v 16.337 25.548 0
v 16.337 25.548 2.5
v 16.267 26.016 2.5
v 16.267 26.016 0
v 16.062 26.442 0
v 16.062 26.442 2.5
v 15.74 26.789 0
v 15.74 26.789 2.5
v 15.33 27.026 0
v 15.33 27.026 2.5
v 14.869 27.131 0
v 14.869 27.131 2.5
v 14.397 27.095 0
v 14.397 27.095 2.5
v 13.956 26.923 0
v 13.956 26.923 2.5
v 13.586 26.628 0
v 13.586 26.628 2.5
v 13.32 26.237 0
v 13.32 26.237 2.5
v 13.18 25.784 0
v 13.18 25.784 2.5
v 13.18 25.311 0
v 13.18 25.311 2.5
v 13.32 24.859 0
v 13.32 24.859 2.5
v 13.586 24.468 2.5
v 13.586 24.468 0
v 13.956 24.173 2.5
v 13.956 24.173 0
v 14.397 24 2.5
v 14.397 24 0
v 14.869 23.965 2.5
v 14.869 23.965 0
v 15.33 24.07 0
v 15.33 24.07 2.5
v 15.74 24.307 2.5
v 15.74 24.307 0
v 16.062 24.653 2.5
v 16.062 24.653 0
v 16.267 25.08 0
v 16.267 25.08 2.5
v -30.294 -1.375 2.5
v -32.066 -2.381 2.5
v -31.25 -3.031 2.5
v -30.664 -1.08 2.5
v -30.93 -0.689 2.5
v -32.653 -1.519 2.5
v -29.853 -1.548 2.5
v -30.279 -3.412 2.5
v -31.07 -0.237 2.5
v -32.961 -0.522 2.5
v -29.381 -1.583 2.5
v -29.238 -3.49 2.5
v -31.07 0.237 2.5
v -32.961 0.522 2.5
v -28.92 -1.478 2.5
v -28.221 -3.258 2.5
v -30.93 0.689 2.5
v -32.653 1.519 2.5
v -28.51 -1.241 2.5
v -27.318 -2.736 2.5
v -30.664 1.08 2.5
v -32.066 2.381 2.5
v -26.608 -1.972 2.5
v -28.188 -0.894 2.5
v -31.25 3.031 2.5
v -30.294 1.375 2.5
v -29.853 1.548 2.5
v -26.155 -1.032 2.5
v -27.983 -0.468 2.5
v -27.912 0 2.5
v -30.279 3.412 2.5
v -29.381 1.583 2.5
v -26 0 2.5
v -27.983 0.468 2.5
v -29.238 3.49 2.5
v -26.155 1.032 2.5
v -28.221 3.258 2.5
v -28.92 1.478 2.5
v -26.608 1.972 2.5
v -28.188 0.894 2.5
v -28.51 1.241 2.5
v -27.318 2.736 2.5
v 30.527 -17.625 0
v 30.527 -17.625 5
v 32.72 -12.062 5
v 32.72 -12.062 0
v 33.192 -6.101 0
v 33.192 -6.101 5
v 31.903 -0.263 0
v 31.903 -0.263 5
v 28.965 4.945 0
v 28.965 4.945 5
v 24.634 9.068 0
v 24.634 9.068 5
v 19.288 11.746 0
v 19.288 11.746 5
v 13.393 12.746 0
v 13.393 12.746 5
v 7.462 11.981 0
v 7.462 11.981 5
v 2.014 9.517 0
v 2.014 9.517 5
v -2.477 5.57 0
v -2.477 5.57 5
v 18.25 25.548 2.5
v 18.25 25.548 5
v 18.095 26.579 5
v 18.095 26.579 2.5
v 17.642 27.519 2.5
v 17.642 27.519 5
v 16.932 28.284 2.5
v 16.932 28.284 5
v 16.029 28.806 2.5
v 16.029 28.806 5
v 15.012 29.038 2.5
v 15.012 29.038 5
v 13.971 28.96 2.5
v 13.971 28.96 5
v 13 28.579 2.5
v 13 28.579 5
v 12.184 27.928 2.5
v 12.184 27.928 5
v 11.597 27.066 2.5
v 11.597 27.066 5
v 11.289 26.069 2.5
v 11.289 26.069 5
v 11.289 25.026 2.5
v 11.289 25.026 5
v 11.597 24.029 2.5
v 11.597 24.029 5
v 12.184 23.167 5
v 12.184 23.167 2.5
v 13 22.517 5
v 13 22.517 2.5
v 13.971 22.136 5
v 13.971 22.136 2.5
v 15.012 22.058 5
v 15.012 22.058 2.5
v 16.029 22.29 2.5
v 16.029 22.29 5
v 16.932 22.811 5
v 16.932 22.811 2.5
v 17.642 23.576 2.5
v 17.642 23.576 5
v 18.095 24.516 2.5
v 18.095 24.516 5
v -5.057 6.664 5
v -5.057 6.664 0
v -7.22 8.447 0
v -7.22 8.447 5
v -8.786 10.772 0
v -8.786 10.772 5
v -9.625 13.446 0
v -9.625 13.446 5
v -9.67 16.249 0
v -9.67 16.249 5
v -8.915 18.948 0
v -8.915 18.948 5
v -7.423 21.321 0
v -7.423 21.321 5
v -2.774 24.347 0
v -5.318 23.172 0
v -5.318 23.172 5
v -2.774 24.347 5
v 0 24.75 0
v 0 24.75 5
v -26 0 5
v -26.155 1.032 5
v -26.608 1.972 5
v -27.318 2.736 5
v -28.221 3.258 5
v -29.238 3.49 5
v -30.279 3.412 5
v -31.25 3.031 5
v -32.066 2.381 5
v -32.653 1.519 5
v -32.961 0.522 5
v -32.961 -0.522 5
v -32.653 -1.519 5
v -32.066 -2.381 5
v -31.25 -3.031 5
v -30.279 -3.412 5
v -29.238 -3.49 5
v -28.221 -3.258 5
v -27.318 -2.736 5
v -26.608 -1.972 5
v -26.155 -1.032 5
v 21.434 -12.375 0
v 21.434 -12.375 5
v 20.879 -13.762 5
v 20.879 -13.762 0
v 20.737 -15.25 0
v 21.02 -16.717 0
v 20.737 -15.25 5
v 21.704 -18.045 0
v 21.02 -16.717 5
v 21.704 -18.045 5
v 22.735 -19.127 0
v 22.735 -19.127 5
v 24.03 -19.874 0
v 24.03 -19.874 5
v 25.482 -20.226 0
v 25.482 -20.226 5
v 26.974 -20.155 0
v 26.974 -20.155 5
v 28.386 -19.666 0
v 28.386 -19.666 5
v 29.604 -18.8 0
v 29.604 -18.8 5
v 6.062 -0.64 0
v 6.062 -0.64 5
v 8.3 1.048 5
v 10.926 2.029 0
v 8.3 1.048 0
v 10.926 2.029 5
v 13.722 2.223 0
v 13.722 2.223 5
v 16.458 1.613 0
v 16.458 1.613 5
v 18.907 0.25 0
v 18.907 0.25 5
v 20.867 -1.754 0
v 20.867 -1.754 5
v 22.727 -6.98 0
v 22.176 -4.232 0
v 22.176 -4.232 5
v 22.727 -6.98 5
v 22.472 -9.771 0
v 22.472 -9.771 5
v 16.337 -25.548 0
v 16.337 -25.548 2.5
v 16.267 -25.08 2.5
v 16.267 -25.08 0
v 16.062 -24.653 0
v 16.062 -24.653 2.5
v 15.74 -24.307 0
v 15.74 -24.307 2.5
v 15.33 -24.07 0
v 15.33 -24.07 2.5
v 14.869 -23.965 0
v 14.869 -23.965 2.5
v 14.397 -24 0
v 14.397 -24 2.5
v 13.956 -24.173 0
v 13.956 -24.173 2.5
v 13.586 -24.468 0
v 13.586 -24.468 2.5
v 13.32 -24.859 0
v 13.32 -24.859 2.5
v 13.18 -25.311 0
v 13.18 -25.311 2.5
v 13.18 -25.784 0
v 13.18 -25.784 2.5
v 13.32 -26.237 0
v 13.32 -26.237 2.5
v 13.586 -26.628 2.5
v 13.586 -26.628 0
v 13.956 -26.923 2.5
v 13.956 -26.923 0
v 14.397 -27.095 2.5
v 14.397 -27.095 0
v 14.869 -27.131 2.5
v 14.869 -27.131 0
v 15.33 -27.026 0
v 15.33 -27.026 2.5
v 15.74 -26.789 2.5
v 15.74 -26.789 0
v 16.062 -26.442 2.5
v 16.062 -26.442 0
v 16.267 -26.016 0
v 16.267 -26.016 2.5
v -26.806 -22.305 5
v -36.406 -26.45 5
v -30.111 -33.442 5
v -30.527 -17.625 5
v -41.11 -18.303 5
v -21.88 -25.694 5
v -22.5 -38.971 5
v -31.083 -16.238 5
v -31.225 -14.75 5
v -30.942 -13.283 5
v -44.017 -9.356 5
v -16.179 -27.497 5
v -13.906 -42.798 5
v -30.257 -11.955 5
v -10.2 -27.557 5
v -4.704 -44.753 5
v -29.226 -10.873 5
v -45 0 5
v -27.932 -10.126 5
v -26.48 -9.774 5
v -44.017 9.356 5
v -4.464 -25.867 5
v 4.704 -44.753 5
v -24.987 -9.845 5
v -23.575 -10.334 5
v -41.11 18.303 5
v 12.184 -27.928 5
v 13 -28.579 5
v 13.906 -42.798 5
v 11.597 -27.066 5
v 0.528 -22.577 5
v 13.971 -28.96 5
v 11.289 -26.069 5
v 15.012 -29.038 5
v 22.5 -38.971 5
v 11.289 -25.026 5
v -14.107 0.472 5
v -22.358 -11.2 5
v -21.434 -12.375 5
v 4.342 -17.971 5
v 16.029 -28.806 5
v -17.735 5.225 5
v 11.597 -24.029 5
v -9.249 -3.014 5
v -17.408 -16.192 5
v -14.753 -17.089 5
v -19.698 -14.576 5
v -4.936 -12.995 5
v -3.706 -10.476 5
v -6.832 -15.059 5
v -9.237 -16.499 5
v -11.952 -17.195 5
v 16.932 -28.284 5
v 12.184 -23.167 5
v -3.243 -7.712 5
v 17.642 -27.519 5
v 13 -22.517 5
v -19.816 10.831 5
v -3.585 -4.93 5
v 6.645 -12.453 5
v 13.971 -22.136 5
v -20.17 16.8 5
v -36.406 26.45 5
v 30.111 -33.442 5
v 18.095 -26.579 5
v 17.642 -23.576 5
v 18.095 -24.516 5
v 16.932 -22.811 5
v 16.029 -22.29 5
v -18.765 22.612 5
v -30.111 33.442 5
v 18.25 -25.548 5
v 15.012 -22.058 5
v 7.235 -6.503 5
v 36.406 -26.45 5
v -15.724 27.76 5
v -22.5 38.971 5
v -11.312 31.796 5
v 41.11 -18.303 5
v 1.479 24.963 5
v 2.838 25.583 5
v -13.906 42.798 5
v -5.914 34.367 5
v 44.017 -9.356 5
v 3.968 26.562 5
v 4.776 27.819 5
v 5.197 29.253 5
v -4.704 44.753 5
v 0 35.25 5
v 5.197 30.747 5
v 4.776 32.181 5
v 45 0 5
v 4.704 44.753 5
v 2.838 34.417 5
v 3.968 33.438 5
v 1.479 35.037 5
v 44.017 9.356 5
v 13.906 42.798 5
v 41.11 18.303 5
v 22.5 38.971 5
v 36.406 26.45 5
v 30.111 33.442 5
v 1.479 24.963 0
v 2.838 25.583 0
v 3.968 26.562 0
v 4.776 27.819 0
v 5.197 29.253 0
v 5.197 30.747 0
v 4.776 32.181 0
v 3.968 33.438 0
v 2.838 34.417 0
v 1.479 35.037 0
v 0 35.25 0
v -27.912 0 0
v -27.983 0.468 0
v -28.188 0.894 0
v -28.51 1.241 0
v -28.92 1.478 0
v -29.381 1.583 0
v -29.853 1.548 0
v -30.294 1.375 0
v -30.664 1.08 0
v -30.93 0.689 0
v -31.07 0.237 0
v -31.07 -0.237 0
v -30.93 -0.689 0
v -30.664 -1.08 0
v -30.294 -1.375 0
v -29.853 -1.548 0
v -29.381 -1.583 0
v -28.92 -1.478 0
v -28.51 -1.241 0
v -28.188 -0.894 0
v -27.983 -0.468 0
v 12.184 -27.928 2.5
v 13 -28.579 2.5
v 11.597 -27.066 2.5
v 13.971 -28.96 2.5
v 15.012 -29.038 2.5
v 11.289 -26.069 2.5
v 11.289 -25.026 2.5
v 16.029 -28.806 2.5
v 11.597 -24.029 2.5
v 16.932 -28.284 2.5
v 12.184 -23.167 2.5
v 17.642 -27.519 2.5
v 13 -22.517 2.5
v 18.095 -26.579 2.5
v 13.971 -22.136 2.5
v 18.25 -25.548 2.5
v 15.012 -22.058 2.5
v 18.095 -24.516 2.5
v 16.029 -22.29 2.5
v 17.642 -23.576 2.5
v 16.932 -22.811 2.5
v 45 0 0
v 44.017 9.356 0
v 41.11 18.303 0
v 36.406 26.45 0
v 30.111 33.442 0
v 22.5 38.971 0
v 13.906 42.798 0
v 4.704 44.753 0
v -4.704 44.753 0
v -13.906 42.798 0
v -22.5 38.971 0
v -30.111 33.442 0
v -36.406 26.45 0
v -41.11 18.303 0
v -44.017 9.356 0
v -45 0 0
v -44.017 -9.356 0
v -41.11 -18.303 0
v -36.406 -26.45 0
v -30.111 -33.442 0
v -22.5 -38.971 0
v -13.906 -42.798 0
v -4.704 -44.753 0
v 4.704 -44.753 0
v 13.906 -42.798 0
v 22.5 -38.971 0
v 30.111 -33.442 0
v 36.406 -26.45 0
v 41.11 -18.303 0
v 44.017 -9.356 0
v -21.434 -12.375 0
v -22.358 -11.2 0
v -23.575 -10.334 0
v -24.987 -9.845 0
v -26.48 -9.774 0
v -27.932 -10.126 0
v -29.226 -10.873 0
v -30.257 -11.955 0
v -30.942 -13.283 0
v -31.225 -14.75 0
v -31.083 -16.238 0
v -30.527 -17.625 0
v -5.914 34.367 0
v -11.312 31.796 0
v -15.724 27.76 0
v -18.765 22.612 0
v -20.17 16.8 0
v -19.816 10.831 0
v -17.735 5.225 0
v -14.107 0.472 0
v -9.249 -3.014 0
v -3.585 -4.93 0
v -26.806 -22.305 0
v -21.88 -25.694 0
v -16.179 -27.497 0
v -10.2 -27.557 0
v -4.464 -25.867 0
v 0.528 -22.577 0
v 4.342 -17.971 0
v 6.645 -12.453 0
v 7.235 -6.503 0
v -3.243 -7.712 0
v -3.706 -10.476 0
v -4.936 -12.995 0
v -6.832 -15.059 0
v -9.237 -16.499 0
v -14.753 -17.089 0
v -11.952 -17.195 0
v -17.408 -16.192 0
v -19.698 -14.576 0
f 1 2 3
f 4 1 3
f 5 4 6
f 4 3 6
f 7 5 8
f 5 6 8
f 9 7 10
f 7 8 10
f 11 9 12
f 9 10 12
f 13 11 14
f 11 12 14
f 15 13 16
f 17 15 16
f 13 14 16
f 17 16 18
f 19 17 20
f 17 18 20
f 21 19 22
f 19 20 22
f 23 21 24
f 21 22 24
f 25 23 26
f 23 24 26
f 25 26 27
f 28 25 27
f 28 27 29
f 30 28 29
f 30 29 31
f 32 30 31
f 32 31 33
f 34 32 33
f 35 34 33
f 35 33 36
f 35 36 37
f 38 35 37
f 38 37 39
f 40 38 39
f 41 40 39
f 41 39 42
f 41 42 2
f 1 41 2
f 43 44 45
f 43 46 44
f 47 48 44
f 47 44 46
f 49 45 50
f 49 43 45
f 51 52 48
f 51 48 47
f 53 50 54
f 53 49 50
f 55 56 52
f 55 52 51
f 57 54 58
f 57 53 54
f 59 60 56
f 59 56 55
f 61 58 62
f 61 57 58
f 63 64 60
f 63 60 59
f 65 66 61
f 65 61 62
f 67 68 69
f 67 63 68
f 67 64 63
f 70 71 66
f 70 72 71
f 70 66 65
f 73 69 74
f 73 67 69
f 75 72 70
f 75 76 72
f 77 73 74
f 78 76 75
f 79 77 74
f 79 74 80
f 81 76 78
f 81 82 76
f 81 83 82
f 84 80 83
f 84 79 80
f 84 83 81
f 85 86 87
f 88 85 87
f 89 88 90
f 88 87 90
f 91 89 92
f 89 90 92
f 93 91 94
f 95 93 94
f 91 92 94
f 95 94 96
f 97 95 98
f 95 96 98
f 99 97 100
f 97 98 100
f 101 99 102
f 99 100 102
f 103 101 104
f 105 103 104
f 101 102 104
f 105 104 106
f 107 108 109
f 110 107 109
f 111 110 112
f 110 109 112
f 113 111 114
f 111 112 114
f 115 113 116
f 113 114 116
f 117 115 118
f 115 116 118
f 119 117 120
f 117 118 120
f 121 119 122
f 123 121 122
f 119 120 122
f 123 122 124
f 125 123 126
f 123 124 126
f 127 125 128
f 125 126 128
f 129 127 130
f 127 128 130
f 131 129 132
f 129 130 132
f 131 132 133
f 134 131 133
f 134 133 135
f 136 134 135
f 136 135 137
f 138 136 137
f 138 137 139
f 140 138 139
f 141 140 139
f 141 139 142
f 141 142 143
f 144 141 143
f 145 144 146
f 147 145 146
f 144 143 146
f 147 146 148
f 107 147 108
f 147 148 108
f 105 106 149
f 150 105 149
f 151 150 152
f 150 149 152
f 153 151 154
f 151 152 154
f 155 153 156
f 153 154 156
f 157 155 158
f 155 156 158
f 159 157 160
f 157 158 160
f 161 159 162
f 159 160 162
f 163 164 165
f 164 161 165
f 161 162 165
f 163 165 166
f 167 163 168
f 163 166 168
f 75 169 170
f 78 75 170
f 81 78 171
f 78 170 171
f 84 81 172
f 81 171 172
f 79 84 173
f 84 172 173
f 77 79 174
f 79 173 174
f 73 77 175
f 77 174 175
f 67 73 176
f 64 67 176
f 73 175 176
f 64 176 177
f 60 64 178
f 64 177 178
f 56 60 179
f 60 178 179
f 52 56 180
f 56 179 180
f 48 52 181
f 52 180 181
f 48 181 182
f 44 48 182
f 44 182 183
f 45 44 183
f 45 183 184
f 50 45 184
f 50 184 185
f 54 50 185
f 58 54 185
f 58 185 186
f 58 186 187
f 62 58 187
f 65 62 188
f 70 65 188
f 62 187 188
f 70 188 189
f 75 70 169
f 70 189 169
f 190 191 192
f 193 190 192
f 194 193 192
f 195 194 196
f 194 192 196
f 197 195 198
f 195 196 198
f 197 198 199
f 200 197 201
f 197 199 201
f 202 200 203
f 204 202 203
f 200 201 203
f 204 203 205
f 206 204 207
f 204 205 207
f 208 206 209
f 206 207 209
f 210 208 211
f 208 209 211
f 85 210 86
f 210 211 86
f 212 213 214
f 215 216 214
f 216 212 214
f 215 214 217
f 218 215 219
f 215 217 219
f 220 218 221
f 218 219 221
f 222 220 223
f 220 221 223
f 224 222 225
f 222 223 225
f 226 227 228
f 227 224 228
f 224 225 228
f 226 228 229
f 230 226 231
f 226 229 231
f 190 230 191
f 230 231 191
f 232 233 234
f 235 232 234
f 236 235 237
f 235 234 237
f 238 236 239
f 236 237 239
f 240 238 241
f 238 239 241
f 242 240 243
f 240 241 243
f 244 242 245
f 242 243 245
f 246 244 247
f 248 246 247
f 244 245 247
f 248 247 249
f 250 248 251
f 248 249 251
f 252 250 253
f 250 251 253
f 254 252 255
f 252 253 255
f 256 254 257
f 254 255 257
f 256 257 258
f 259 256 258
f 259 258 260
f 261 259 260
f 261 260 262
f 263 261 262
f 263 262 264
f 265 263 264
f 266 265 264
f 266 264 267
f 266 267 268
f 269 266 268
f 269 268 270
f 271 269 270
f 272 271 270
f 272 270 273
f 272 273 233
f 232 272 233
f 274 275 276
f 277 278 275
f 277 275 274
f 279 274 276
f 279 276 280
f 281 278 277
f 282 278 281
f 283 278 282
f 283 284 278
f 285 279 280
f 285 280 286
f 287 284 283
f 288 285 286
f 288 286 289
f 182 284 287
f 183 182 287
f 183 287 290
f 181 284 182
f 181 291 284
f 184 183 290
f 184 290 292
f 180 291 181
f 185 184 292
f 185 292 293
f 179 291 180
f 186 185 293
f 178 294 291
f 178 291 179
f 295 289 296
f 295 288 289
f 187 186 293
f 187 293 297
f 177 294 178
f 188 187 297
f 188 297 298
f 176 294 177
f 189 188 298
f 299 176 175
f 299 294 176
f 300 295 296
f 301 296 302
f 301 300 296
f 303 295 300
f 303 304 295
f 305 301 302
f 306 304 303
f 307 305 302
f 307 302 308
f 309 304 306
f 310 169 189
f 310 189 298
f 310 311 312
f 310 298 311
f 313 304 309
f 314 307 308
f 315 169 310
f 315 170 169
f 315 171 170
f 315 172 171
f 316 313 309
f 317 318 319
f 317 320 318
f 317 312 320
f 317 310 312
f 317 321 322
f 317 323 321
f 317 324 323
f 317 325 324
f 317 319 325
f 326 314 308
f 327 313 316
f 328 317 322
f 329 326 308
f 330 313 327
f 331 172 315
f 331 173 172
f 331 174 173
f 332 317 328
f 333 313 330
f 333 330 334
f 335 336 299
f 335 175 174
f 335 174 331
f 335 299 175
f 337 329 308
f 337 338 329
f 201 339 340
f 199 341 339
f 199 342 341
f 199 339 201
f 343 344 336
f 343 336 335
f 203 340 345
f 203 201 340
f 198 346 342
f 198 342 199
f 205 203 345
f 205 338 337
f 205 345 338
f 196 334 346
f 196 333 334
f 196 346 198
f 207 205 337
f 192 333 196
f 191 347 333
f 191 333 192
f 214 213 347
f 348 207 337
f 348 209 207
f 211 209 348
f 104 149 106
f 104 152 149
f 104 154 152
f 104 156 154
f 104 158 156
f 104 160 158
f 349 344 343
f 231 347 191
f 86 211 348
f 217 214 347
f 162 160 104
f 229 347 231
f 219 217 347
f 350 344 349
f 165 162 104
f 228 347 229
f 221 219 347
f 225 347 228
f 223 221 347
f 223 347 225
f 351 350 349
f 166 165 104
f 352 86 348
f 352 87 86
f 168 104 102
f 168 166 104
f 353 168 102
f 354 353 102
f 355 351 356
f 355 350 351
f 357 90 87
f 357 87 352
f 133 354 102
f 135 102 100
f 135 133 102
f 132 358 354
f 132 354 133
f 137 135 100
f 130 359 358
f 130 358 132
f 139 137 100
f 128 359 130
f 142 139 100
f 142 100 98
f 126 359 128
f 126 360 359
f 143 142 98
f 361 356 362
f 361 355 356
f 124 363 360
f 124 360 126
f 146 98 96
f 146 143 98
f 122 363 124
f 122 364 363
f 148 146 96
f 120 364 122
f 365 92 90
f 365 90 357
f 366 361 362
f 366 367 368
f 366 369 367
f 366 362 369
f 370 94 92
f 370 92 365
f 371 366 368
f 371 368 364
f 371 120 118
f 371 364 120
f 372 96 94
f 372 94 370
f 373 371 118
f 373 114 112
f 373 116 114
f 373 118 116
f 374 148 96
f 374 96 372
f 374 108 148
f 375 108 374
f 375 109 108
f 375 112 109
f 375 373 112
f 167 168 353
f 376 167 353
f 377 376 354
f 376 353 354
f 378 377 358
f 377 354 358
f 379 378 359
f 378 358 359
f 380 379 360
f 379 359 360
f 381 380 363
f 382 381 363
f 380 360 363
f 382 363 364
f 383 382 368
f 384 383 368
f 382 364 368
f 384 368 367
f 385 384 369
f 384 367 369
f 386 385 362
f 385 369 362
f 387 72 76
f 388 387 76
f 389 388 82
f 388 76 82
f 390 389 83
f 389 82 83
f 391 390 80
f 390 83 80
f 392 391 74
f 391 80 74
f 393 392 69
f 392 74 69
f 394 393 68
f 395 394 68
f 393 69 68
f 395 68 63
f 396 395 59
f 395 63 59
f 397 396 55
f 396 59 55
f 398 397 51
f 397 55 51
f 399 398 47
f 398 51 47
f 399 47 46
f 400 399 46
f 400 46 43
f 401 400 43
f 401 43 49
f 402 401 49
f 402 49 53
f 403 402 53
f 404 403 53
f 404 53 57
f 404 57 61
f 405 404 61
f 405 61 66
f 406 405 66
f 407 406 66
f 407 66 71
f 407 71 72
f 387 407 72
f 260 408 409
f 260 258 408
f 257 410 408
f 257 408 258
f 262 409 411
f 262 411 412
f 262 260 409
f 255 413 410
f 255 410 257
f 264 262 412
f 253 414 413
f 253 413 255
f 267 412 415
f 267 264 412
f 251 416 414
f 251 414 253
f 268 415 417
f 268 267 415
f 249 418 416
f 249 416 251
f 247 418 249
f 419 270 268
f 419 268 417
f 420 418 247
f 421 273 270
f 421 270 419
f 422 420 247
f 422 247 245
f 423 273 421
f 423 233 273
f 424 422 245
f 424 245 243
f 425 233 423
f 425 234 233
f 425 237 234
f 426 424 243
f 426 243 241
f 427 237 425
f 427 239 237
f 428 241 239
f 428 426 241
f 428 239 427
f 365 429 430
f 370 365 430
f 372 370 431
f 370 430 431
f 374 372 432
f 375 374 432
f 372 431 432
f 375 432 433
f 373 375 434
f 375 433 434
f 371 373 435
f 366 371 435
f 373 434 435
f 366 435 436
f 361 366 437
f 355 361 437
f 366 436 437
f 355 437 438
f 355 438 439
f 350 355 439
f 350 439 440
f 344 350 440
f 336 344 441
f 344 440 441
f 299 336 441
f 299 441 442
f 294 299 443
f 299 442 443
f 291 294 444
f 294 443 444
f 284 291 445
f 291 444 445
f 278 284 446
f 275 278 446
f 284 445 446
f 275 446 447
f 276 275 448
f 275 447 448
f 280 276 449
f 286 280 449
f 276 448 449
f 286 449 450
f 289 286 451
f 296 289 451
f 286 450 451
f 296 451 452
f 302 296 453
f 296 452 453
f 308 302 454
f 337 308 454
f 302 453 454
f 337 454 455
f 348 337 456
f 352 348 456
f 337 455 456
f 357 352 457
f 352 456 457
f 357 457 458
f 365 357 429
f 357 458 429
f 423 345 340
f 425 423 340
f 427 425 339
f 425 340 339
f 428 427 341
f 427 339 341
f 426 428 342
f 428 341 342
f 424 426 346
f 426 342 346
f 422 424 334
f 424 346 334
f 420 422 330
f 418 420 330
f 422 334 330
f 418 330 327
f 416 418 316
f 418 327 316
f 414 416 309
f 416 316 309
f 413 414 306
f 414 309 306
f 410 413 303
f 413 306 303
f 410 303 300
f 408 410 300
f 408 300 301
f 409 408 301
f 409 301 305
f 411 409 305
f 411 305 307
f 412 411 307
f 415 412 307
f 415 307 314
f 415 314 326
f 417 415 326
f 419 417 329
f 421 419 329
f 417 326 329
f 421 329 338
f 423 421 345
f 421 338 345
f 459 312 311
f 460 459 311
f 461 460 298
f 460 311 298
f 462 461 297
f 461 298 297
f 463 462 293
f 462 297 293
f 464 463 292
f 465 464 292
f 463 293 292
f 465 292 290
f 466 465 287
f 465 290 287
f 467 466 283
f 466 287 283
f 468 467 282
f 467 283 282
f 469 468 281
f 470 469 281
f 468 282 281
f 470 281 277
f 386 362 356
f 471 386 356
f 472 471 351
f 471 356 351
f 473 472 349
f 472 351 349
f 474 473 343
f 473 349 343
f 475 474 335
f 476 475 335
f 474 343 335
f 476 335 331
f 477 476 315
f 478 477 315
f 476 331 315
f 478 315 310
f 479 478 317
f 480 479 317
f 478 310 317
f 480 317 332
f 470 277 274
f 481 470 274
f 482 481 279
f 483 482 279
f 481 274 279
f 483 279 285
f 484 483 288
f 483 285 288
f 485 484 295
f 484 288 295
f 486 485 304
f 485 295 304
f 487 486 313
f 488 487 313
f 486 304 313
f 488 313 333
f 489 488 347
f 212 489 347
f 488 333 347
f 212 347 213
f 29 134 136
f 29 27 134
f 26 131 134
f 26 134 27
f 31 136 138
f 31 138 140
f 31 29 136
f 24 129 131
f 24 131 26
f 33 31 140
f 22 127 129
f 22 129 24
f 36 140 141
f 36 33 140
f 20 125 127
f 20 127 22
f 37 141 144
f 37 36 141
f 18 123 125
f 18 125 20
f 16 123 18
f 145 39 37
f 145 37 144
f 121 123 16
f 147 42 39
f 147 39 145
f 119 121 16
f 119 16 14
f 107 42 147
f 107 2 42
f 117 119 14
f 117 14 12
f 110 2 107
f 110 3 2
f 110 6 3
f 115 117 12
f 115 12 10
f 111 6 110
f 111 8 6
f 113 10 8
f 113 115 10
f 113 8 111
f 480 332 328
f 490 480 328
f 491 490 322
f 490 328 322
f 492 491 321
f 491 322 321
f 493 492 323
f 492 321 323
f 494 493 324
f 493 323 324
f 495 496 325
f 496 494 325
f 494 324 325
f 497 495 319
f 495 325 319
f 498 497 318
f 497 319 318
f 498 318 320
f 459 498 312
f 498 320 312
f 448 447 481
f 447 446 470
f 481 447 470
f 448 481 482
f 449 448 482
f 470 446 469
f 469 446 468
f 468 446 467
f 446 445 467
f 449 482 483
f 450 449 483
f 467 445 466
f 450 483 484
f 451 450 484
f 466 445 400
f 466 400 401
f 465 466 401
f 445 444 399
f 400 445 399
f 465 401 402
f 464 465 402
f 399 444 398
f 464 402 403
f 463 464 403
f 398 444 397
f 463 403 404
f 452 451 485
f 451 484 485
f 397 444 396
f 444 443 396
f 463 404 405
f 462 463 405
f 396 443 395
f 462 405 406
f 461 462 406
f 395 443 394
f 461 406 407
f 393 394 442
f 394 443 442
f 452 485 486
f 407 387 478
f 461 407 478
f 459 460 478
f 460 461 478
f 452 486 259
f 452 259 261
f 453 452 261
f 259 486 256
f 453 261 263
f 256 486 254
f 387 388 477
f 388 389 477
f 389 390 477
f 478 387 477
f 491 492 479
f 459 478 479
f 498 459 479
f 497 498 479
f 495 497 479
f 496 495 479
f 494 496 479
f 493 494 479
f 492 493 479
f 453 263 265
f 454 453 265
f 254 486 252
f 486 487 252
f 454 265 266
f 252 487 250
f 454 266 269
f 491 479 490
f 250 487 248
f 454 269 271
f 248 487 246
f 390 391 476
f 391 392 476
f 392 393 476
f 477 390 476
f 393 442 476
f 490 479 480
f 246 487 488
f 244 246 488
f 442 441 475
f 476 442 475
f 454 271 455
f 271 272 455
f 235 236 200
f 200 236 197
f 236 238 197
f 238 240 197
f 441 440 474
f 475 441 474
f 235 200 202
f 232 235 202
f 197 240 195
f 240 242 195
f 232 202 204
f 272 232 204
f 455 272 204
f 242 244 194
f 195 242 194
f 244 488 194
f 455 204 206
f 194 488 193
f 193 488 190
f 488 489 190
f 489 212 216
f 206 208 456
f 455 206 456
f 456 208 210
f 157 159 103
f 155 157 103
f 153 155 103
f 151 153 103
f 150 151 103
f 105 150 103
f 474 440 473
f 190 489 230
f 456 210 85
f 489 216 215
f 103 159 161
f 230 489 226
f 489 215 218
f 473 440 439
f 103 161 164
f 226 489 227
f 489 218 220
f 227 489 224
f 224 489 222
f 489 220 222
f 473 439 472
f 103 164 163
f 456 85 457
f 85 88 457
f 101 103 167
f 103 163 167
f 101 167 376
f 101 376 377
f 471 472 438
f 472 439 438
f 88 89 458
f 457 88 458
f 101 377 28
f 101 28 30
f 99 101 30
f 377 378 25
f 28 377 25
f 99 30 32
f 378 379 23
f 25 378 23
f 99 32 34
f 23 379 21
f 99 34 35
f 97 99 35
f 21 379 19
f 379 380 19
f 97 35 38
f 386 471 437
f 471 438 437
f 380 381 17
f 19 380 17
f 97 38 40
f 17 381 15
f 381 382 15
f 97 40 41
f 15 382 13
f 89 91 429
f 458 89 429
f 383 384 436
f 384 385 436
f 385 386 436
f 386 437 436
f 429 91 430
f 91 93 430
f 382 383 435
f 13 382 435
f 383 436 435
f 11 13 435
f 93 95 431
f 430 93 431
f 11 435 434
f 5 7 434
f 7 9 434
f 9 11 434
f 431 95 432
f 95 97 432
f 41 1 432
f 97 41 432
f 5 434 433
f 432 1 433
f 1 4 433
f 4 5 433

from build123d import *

# Parameters (mm, degrees)
CROQUIS1_R            = 45
DISCO_DEPTH           = 5
PATR_NGIRO_DEPTH      = 64.835726674
CROQUIS7_R            = 1.5875
BARRENOSEJES_DEPTH    = 10
CROQUIS8_R            = 3.5
CORTAR_EXTRUIR5_DEPTH = 2.5


with BuildPart() as part:
    # Croquis1 → Disco (new body)
    with BuildSketch(Plane.XY):
        Circle(CROQUIS1_R)
    extrude(amount=DISCO_DEPTH)

    # Croquis6 → PatrónGiro (cut, through all)
    with BuildSketch(Plane.XY.offset(5)):
        with BuildLine():
            ThreePointArc((-30.527395483, -17.625), (-4.464035413, -25.86746934), (6.062177826, -0.639788633))
            ThreePointArc((6.062177826, -0.639788633), (18.906715666, 0.249805468), (21.434128744, -12.375))
            ThreePointArc((21.434128744, -12.375), (23.355762114, -19.54663337), (30.527395483, -17.625))
            ThreePointArc((30.527395483, -17.625), (24.633903286, 9.067766599), (-2.477015704, 5.569894316))
            ThreePointArc((-2.477015704, 5.569894316), (-9.669695714, 16.248793335), (0, 24.75))
            ThreePointArc((0, 24.75), (5.25, 30), (0, 35.25))
            ThreePointArc((0, 35.25), (-20.169867874, 16.799702741), (-3.585162122, -4.930105684))
            ThreePointArc((-3.585162122, -4.930105684), (-9.237019952, -16.498598803), (-21.434128744, -12.375))
            ThreePointArc((-21.434128744, -12.375), (-28.605762114, -10.45336663), (-30.527395483, -17.625))
        make_face()
    extrude(amount=-PATR_NGIRO_DEPTH, mode=Mode.SUBTRACT)

    # Croquis7 → BarrenosEjes (cut)
    with BuildSketch(Plane.XY.offset(5)):
        with Locations((-29.5, 0)):
            Circle(CROQUIS7_R)
        with Locations((14.75, 25.547749412)):
            Circle(CROQUIS7_R)
        with Locations((14.75, -25.547749412)):
            Circle(CROQUIS7_R)
    extrude(amount=-BARRENOSEJES_DEPTH, mode=Mode.SUBTRACT)

    # Croquis8 → Cortar-Extruir5 (cut)
    with BuildSketch(Plane.XY.offset(5)):
        with Locations((-29.5, 0)):
            Circle(CROQUIS8_R)
        with Locations((14.75, -25.547749412)):
            Circle(CROQUIS8_R)
        with Locations((14.75, 25.547749412)):
            Circle(CROQUIS8_R)
    extrude(amount=-CORTAR_EXTRUIR5_DEPTH, mode=Mode.SUBTRACT)


solid = part.part
